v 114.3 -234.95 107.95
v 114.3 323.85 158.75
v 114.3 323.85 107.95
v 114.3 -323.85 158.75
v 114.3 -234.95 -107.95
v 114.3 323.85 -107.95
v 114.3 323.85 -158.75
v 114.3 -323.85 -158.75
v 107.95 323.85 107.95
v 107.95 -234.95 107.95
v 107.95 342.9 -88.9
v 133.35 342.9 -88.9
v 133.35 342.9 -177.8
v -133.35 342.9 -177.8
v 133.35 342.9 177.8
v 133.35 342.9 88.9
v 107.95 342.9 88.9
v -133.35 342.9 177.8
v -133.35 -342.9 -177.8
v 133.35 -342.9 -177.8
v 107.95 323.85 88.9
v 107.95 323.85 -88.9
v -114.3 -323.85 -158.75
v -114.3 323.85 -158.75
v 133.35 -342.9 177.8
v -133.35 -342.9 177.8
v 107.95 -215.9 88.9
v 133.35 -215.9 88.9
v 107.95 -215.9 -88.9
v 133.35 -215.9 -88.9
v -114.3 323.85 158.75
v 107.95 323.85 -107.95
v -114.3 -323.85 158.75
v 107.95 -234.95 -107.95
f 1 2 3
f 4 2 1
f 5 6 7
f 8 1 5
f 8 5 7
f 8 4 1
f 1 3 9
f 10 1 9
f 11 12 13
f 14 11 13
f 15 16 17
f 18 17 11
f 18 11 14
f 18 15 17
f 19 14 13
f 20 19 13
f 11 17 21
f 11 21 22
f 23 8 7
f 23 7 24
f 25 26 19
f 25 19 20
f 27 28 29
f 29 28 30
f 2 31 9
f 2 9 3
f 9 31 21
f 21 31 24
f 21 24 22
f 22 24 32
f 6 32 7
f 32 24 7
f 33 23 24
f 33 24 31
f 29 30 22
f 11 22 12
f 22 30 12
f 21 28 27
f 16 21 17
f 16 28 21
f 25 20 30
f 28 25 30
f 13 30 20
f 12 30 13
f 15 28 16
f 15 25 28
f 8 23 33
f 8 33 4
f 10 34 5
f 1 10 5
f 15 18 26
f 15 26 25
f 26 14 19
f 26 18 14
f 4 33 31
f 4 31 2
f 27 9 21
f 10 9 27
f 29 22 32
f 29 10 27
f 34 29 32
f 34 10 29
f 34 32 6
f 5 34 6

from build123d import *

# Parameters (mm, degrees)
SALIENTE_EXTRUIR1_DEPTH = 177.8
CROQUIS2_W              = 177.8
CROQUIS2_H              = 558.8
CORTAR_EXTRUIR1_DEPTH   = 25.4
VACIADO1_START          = -323.85
VACIADO1_DEPTH          = 647.7
VACIADO1_2_OUTLINE_W    = 6.35
VACIADO1_2_OUTLINE_H    = 215.9
VACIADO1_2_DEPTH        = 88.9


# Read off the part's stored shape, not the designer's step: Vaciado1
with BuildPart() as part:
    # Croquis1 → Saliente-Extruir1 (new, symmetric)
    with BuildSketch(Plane.XY):
        Polygon((-133.35, 342.9), (-133.35, -342.9), (133.35, -342.9), (133.35, 0), (133.35, 342.9), align=None)
    extrude(amount=SALIENTE_EXTRUIR1_DEPTH, both=True)

    # Croquis2 → Cortar-Extruir1 (cut)
    with BuildSketch(Plane(origin=(133.35, 0, 0), x_dir=(0, 0, -1), z_dir=(1, 0, 0))):
        with Locations((0, 63.5)):
            Rectangle(CROQUIS2_W, CROQUIS2_H)
    extrude(amount=-CORTAR_EXTRUIR1_DEPTH, mode=Mode.SUBTRACT)

    # Vaciado1 outline → Vaciado1 (cut)
    with BuildSketch(Plane(origin=(0, 0, 0), x_dir=(1, 0, 0), z_dir=(0, 1, 0)).offset(VACIADO1_START)):
        Polygon((-114.3, 158.75), (-114.3, -158.75), (114.3, -158.75), (114.3, -107.95), (107.95, -107.95), (107.95, 107.95), (114.3, 107.95), (114.3, 158.75), align=None)
    extrude(amount=VACIADO1_DEPTH, mode=Mode.SUBTRACT)

    # Vaciado1 2 outline → Vaciado1 2 (cut)
    with BuildSketch(Plane(origin=(0, 0, 0), x_dir=(1, 0, 0), z_dir=(0, 1, 0)).offset(VACIADO1_START)):
        with Locations((111.125, 0)):
            Rectangle(VACIADO1_2_OUTLINE_W, VACIADO1_2_OUTLINE_H)
    extrude(amount=VACIADO1_2_DEPTH, mode=Mode.SUBTRACT)


solid = part.part
